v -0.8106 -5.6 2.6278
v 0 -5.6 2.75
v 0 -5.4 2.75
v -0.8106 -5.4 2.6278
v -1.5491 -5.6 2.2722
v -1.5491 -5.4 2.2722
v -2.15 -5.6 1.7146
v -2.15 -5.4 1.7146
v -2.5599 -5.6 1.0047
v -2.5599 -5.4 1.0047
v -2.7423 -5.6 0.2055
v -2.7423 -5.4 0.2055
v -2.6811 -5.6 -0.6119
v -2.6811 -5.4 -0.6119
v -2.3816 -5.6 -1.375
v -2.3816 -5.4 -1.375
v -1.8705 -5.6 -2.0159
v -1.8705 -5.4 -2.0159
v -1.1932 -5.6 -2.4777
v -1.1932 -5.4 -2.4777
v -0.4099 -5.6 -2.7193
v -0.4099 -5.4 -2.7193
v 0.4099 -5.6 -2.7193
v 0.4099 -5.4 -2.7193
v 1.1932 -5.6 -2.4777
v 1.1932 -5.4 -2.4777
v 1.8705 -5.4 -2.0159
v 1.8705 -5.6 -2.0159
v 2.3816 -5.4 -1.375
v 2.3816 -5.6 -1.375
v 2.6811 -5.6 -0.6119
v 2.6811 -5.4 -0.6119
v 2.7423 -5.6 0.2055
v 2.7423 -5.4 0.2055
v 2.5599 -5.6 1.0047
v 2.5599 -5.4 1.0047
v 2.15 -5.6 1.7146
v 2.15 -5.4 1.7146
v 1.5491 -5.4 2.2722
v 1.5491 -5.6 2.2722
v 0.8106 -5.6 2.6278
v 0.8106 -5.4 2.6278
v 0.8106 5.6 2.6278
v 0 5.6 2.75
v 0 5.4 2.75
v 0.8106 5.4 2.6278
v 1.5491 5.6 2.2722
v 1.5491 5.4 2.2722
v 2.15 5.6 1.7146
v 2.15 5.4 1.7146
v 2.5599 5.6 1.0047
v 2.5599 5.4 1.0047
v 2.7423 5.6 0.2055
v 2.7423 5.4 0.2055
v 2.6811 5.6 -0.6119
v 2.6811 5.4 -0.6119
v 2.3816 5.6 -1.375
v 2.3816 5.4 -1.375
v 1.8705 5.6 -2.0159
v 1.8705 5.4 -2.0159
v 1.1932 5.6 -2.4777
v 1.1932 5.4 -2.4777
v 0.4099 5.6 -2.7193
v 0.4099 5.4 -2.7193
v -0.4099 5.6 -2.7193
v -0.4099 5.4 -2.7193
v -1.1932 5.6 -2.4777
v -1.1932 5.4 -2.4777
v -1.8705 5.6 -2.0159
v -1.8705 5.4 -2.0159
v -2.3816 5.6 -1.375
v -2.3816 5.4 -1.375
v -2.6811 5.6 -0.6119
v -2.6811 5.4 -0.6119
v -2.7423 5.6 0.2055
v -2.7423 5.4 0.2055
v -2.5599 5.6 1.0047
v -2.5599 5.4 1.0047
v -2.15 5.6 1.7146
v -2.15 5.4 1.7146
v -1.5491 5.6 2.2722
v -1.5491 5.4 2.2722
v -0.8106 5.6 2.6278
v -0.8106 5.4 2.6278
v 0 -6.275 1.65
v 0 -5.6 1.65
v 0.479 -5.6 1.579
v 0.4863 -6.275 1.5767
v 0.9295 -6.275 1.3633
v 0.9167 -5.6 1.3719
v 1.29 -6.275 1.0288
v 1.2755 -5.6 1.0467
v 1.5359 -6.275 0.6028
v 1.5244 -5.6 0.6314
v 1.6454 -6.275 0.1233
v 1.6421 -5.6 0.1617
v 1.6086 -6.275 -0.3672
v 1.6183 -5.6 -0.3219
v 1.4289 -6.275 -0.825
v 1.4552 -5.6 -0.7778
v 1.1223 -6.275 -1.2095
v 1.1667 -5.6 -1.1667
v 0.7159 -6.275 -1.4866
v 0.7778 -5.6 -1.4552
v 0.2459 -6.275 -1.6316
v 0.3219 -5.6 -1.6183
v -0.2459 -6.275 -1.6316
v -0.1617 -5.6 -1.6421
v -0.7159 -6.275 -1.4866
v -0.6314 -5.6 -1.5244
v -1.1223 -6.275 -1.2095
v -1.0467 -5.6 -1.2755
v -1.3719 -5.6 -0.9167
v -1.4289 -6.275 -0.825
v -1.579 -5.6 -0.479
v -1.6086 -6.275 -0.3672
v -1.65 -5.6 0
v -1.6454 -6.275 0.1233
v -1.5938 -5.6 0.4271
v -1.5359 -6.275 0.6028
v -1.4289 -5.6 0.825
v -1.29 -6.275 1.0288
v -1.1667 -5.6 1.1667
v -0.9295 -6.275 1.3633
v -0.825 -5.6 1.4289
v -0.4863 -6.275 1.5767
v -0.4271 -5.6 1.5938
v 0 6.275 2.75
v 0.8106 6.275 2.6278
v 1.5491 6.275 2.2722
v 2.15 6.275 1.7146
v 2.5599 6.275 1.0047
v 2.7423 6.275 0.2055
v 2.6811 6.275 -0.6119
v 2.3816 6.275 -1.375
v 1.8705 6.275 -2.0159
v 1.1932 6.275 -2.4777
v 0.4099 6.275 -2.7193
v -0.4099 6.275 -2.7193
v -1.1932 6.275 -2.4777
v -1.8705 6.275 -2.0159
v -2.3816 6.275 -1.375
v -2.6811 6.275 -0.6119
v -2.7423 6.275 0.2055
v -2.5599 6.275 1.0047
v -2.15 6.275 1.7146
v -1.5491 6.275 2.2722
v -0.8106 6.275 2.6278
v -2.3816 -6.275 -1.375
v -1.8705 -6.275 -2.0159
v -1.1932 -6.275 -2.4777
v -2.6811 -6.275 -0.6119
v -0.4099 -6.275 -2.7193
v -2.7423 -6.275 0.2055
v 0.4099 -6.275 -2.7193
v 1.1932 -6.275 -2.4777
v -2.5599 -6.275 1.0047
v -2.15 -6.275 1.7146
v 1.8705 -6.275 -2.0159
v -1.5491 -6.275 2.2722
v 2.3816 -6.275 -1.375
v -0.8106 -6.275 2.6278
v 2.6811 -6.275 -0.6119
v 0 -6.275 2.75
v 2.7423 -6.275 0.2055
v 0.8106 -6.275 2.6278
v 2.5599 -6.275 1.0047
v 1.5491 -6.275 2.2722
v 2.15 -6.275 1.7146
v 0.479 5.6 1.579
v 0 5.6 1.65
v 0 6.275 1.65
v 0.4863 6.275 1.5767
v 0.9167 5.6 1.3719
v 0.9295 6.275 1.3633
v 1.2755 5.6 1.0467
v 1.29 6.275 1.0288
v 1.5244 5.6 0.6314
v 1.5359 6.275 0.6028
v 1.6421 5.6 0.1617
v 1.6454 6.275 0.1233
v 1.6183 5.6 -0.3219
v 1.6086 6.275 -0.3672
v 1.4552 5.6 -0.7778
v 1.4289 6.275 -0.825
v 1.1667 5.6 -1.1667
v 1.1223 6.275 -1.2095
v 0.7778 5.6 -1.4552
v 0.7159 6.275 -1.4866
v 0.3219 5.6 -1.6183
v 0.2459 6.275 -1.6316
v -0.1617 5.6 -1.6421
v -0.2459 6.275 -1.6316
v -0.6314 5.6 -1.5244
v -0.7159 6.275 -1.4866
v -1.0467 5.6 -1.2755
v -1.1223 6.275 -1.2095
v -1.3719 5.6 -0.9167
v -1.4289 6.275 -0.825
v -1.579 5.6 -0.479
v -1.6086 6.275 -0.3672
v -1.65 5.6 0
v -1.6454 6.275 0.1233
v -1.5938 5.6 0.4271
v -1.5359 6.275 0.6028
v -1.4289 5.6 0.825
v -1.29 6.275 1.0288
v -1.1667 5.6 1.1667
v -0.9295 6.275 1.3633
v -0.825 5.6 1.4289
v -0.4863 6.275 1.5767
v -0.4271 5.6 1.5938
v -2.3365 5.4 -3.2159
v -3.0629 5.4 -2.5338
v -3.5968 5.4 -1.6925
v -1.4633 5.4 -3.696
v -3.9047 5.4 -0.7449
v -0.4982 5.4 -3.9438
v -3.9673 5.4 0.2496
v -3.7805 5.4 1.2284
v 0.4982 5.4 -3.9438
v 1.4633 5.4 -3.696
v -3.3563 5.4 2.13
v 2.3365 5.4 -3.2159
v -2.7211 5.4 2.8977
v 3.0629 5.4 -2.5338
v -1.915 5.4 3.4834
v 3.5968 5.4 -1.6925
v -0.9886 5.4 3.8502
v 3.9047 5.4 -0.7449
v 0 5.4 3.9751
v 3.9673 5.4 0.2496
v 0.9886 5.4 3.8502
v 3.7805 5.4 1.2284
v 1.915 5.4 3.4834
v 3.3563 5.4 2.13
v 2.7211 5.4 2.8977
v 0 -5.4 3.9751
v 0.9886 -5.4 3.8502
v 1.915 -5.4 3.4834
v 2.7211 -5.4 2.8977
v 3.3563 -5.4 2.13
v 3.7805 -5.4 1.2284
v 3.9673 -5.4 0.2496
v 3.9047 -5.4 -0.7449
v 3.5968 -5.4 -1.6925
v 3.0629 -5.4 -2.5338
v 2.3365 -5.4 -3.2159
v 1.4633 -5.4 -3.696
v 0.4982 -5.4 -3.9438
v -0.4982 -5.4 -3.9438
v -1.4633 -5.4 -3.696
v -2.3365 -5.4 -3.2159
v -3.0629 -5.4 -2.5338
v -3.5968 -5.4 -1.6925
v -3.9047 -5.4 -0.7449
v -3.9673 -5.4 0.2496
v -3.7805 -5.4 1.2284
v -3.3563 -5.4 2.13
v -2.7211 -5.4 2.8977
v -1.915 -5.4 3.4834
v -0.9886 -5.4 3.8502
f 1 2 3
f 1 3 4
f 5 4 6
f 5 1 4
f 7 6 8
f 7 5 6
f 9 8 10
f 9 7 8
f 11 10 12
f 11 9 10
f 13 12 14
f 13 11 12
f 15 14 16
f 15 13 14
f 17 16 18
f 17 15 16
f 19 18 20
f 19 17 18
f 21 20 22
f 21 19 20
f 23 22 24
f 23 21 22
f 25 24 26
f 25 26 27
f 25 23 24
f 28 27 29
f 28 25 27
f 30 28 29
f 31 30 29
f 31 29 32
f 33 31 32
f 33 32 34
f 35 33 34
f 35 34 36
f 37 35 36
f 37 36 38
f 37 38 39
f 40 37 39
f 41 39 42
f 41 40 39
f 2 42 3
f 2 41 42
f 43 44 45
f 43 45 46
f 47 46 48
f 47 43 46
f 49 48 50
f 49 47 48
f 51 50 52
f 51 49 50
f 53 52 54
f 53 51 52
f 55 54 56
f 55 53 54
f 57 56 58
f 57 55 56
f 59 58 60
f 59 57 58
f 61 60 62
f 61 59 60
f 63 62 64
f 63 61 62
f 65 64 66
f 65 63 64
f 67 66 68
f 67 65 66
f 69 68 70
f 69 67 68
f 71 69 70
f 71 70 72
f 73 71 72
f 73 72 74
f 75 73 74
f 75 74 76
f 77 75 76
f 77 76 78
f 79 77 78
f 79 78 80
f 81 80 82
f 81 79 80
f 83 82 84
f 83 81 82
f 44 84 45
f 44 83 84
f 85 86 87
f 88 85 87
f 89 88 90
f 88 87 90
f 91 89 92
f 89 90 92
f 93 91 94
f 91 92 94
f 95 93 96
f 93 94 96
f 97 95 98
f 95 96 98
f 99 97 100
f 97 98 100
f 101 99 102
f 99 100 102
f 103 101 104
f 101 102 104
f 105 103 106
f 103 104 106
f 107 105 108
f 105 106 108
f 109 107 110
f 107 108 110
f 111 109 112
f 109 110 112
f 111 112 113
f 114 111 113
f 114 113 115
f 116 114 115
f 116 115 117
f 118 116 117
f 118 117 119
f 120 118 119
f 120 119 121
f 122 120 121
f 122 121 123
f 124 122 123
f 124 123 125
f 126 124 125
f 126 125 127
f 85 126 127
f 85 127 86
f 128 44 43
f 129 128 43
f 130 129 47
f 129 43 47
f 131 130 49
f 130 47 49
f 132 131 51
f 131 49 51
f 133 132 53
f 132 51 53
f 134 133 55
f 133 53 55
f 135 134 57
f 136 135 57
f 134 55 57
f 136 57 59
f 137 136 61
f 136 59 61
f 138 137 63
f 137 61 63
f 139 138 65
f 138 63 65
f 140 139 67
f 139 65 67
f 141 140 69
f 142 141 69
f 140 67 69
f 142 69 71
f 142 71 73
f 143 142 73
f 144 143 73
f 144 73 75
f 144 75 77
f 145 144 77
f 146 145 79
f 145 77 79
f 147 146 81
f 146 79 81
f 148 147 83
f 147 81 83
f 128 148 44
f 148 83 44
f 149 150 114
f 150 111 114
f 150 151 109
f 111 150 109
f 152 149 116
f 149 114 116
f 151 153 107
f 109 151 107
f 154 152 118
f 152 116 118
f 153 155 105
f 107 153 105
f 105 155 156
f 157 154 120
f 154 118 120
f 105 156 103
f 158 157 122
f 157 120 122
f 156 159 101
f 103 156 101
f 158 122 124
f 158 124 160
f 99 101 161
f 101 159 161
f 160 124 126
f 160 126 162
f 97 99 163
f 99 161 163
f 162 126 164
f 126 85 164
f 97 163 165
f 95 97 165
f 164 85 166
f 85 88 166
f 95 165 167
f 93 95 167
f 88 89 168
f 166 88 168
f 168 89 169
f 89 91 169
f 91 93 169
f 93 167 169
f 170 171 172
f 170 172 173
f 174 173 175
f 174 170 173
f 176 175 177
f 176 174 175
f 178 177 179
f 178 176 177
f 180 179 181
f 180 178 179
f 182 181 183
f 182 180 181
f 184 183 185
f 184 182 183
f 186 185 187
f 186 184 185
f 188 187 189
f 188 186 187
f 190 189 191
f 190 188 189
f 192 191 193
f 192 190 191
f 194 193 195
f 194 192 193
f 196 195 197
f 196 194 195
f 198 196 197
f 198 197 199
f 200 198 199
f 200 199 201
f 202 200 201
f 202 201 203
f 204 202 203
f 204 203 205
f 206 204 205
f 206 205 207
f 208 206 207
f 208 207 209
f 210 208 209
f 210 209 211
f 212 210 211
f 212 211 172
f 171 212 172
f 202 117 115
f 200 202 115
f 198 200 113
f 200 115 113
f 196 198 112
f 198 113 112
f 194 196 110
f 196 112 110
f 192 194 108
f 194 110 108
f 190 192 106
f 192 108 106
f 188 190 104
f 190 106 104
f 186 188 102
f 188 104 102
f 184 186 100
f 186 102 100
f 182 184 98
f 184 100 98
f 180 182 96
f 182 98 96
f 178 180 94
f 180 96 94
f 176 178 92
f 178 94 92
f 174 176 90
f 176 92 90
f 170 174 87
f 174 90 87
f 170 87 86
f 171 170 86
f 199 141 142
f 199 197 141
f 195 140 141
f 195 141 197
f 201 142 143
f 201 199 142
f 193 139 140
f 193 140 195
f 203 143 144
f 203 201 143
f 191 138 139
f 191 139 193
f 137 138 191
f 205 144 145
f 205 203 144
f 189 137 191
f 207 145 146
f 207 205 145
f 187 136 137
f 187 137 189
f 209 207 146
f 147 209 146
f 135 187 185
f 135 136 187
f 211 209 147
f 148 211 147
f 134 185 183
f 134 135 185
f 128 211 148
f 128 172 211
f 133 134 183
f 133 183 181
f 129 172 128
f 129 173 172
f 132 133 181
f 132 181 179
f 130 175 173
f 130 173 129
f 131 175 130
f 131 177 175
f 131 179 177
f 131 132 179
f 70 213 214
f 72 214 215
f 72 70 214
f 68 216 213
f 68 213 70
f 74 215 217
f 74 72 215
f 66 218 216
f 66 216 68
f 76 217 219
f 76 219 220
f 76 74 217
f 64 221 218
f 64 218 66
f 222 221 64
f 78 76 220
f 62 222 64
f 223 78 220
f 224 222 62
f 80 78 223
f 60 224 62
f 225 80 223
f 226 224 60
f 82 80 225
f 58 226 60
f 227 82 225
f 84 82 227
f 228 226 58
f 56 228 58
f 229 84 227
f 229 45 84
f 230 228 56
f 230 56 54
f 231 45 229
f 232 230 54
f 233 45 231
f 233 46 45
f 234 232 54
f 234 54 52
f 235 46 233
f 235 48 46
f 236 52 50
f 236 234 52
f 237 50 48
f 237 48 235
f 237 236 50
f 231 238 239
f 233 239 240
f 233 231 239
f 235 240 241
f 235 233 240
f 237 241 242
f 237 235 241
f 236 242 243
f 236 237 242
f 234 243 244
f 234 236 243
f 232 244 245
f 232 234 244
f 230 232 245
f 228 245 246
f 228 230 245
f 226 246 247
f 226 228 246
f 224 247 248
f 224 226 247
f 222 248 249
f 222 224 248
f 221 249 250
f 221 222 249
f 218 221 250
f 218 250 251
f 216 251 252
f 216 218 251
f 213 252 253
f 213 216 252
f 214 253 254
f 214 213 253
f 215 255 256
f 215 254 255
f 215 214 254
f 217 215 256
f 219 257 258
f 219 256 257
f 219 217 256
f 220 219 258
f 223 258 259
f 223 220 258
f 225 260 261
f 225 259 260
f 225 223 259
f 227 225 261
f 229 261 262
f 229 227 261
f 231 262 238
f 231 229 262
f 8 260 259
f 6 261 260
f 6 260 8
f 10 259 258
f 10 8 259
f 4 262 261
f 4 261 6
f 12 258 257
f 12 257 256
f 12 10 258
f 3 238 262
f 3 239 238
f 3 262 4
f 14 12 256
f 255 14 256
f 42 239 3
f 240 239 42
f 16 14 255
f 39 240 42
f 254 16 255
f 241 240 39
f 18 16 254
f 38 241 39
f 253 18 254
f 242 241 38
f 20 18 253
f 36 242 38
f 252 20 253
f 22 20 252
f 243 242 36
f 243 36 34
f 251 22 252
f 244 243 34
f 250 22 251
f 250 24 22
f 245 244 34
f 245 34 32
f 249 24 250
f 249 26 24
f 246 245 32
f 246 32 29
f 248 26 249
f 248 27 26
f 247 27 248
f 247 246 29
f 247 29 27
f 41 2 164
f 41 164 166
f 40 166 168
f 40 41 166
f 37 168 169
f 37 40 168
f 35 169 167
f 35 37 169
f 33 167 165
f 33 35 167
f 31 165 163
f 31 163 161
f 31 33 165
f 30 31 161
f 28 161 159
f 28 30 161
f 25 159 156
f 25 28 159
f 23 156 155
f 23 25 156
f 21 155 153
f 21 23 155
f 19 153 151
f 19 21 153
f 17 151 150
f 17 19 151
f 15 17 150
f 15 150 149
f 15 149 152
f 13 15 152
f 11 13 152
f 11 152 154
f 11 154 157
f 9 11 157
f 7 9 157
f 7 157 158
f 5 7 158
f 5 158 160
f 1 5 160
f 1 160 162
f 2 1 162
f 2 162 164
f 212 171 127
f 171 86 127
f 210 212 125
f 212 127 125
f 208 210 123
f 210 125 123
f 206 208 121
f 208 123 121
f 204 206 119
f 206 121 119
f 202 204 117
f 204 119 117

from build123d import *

# Parameters (mm, degrees)
SKETCH2_R                = 3.9751
BOSS_EXTRUDE1_DEPTH      = 5.6
M4X0_7_TAPPED_HOLE1_D    = 3.3
SKETCH7_R                = 2.75
SKETCH7_R_2              = 1.65
BOSS_EXTRUDE2_DEPTH      = 0.675
BOSS_EXTRUDE2_DEPTH_BACK = 11.875
SKETCH9_R                = 3.9751
SKETCH9_R_2              = 2.75
CUT_EXTRUDE1_DEPTH       = 0.2
SKETCH10_R               = 3.9751
SKETCH10_R_2             = 2.75
CUT_EXTRUDE3_DEPTH       = 0.2


with BuildPart() as part:
    # Sketch2 → Boss-Extrude1 (new, symmetric)
    with BuildSketch(Plane(origin=(0, 0, 0), x_dir=(1, 0, 0), z_dir=(0, 1, 0))):
        with Locations(Location((0, 0, 0), (0, 0, 270))):
            Circle(SKETCH2_R)
    extrude(amount=BOSS_EXTRUDE1_DEPTH, both=True)

    # M4x0.7 Tapped Hole1 (through all)
    with Locations(Plane(origin=(0, 5.6, 0), x_dir=(1, 0, 0), z_dir=(0, 1, 0))):
        with Locations((0, 0)):
            Hole(M4X0_7_TAPPED_HOLE1_D / 2)

    # Sketch7 → Boss-Extrude2 (add, two sides)
    with BuildSketch(Plane(origin=(0, 5.6, 0), x_dir=(1, 0, 0), z_dir=(0, 1, 0))) as boss_extrude2_sk:
        with Locations(Location((0, 0, 0), (0, 0, 270))):
            Circle(SKETCH7_R)
        with Locations(Location((0, 0, 0), (0, 0, 270))):
            Circle(SKETCH7_R_2, mode=Mode.SUBTRACT)
    extrude(amount=BOSS_EXTRUDE2_DEPTH)
    extrude(boss_extrude2_sk.sketch, amount=-BOSS_EXTRUDE2_DEPTH_BACK)

    # Sketch9 → Cut-Extrude1 (cut)
    with BuildSketch(Plane(origin=(0, 5.6, 0), x_dir=(1, 0, 0), z_dir=(0, 1, 0))):
        with Locations(Location((0, 0, 0), (0, 0, 270))):
            Circle(SKETCH9_R)
        with Locations(Location((0, 0, 0), (0, 0, 270))):
            Circle(SKETCH9_R_2, mode=Mode.SUBTRACT)
    extrude(amount=-CUT_EXTRUDE1_DEPTH, mode=Mode.SUBTRACT)

    # Sketch10 → Cut-Extrude3 (cut)
    with BuildSketch(Plane.XZ.offset(5.6)):
        with Locations(Location((0, 0, 0), (0, 0, 270))):
            Circle(SKETCH10_R)
        with Locations(Location((0, 0, 0), (0, 0, 90))):
            Circle(SKETCH10_R_2, mode=Mode.SUBTRACT)
    extrude(amount=-CUT_EXTRUDE3_DEPTH, mode=Mode.SUBTRACT)


solid = part.part
